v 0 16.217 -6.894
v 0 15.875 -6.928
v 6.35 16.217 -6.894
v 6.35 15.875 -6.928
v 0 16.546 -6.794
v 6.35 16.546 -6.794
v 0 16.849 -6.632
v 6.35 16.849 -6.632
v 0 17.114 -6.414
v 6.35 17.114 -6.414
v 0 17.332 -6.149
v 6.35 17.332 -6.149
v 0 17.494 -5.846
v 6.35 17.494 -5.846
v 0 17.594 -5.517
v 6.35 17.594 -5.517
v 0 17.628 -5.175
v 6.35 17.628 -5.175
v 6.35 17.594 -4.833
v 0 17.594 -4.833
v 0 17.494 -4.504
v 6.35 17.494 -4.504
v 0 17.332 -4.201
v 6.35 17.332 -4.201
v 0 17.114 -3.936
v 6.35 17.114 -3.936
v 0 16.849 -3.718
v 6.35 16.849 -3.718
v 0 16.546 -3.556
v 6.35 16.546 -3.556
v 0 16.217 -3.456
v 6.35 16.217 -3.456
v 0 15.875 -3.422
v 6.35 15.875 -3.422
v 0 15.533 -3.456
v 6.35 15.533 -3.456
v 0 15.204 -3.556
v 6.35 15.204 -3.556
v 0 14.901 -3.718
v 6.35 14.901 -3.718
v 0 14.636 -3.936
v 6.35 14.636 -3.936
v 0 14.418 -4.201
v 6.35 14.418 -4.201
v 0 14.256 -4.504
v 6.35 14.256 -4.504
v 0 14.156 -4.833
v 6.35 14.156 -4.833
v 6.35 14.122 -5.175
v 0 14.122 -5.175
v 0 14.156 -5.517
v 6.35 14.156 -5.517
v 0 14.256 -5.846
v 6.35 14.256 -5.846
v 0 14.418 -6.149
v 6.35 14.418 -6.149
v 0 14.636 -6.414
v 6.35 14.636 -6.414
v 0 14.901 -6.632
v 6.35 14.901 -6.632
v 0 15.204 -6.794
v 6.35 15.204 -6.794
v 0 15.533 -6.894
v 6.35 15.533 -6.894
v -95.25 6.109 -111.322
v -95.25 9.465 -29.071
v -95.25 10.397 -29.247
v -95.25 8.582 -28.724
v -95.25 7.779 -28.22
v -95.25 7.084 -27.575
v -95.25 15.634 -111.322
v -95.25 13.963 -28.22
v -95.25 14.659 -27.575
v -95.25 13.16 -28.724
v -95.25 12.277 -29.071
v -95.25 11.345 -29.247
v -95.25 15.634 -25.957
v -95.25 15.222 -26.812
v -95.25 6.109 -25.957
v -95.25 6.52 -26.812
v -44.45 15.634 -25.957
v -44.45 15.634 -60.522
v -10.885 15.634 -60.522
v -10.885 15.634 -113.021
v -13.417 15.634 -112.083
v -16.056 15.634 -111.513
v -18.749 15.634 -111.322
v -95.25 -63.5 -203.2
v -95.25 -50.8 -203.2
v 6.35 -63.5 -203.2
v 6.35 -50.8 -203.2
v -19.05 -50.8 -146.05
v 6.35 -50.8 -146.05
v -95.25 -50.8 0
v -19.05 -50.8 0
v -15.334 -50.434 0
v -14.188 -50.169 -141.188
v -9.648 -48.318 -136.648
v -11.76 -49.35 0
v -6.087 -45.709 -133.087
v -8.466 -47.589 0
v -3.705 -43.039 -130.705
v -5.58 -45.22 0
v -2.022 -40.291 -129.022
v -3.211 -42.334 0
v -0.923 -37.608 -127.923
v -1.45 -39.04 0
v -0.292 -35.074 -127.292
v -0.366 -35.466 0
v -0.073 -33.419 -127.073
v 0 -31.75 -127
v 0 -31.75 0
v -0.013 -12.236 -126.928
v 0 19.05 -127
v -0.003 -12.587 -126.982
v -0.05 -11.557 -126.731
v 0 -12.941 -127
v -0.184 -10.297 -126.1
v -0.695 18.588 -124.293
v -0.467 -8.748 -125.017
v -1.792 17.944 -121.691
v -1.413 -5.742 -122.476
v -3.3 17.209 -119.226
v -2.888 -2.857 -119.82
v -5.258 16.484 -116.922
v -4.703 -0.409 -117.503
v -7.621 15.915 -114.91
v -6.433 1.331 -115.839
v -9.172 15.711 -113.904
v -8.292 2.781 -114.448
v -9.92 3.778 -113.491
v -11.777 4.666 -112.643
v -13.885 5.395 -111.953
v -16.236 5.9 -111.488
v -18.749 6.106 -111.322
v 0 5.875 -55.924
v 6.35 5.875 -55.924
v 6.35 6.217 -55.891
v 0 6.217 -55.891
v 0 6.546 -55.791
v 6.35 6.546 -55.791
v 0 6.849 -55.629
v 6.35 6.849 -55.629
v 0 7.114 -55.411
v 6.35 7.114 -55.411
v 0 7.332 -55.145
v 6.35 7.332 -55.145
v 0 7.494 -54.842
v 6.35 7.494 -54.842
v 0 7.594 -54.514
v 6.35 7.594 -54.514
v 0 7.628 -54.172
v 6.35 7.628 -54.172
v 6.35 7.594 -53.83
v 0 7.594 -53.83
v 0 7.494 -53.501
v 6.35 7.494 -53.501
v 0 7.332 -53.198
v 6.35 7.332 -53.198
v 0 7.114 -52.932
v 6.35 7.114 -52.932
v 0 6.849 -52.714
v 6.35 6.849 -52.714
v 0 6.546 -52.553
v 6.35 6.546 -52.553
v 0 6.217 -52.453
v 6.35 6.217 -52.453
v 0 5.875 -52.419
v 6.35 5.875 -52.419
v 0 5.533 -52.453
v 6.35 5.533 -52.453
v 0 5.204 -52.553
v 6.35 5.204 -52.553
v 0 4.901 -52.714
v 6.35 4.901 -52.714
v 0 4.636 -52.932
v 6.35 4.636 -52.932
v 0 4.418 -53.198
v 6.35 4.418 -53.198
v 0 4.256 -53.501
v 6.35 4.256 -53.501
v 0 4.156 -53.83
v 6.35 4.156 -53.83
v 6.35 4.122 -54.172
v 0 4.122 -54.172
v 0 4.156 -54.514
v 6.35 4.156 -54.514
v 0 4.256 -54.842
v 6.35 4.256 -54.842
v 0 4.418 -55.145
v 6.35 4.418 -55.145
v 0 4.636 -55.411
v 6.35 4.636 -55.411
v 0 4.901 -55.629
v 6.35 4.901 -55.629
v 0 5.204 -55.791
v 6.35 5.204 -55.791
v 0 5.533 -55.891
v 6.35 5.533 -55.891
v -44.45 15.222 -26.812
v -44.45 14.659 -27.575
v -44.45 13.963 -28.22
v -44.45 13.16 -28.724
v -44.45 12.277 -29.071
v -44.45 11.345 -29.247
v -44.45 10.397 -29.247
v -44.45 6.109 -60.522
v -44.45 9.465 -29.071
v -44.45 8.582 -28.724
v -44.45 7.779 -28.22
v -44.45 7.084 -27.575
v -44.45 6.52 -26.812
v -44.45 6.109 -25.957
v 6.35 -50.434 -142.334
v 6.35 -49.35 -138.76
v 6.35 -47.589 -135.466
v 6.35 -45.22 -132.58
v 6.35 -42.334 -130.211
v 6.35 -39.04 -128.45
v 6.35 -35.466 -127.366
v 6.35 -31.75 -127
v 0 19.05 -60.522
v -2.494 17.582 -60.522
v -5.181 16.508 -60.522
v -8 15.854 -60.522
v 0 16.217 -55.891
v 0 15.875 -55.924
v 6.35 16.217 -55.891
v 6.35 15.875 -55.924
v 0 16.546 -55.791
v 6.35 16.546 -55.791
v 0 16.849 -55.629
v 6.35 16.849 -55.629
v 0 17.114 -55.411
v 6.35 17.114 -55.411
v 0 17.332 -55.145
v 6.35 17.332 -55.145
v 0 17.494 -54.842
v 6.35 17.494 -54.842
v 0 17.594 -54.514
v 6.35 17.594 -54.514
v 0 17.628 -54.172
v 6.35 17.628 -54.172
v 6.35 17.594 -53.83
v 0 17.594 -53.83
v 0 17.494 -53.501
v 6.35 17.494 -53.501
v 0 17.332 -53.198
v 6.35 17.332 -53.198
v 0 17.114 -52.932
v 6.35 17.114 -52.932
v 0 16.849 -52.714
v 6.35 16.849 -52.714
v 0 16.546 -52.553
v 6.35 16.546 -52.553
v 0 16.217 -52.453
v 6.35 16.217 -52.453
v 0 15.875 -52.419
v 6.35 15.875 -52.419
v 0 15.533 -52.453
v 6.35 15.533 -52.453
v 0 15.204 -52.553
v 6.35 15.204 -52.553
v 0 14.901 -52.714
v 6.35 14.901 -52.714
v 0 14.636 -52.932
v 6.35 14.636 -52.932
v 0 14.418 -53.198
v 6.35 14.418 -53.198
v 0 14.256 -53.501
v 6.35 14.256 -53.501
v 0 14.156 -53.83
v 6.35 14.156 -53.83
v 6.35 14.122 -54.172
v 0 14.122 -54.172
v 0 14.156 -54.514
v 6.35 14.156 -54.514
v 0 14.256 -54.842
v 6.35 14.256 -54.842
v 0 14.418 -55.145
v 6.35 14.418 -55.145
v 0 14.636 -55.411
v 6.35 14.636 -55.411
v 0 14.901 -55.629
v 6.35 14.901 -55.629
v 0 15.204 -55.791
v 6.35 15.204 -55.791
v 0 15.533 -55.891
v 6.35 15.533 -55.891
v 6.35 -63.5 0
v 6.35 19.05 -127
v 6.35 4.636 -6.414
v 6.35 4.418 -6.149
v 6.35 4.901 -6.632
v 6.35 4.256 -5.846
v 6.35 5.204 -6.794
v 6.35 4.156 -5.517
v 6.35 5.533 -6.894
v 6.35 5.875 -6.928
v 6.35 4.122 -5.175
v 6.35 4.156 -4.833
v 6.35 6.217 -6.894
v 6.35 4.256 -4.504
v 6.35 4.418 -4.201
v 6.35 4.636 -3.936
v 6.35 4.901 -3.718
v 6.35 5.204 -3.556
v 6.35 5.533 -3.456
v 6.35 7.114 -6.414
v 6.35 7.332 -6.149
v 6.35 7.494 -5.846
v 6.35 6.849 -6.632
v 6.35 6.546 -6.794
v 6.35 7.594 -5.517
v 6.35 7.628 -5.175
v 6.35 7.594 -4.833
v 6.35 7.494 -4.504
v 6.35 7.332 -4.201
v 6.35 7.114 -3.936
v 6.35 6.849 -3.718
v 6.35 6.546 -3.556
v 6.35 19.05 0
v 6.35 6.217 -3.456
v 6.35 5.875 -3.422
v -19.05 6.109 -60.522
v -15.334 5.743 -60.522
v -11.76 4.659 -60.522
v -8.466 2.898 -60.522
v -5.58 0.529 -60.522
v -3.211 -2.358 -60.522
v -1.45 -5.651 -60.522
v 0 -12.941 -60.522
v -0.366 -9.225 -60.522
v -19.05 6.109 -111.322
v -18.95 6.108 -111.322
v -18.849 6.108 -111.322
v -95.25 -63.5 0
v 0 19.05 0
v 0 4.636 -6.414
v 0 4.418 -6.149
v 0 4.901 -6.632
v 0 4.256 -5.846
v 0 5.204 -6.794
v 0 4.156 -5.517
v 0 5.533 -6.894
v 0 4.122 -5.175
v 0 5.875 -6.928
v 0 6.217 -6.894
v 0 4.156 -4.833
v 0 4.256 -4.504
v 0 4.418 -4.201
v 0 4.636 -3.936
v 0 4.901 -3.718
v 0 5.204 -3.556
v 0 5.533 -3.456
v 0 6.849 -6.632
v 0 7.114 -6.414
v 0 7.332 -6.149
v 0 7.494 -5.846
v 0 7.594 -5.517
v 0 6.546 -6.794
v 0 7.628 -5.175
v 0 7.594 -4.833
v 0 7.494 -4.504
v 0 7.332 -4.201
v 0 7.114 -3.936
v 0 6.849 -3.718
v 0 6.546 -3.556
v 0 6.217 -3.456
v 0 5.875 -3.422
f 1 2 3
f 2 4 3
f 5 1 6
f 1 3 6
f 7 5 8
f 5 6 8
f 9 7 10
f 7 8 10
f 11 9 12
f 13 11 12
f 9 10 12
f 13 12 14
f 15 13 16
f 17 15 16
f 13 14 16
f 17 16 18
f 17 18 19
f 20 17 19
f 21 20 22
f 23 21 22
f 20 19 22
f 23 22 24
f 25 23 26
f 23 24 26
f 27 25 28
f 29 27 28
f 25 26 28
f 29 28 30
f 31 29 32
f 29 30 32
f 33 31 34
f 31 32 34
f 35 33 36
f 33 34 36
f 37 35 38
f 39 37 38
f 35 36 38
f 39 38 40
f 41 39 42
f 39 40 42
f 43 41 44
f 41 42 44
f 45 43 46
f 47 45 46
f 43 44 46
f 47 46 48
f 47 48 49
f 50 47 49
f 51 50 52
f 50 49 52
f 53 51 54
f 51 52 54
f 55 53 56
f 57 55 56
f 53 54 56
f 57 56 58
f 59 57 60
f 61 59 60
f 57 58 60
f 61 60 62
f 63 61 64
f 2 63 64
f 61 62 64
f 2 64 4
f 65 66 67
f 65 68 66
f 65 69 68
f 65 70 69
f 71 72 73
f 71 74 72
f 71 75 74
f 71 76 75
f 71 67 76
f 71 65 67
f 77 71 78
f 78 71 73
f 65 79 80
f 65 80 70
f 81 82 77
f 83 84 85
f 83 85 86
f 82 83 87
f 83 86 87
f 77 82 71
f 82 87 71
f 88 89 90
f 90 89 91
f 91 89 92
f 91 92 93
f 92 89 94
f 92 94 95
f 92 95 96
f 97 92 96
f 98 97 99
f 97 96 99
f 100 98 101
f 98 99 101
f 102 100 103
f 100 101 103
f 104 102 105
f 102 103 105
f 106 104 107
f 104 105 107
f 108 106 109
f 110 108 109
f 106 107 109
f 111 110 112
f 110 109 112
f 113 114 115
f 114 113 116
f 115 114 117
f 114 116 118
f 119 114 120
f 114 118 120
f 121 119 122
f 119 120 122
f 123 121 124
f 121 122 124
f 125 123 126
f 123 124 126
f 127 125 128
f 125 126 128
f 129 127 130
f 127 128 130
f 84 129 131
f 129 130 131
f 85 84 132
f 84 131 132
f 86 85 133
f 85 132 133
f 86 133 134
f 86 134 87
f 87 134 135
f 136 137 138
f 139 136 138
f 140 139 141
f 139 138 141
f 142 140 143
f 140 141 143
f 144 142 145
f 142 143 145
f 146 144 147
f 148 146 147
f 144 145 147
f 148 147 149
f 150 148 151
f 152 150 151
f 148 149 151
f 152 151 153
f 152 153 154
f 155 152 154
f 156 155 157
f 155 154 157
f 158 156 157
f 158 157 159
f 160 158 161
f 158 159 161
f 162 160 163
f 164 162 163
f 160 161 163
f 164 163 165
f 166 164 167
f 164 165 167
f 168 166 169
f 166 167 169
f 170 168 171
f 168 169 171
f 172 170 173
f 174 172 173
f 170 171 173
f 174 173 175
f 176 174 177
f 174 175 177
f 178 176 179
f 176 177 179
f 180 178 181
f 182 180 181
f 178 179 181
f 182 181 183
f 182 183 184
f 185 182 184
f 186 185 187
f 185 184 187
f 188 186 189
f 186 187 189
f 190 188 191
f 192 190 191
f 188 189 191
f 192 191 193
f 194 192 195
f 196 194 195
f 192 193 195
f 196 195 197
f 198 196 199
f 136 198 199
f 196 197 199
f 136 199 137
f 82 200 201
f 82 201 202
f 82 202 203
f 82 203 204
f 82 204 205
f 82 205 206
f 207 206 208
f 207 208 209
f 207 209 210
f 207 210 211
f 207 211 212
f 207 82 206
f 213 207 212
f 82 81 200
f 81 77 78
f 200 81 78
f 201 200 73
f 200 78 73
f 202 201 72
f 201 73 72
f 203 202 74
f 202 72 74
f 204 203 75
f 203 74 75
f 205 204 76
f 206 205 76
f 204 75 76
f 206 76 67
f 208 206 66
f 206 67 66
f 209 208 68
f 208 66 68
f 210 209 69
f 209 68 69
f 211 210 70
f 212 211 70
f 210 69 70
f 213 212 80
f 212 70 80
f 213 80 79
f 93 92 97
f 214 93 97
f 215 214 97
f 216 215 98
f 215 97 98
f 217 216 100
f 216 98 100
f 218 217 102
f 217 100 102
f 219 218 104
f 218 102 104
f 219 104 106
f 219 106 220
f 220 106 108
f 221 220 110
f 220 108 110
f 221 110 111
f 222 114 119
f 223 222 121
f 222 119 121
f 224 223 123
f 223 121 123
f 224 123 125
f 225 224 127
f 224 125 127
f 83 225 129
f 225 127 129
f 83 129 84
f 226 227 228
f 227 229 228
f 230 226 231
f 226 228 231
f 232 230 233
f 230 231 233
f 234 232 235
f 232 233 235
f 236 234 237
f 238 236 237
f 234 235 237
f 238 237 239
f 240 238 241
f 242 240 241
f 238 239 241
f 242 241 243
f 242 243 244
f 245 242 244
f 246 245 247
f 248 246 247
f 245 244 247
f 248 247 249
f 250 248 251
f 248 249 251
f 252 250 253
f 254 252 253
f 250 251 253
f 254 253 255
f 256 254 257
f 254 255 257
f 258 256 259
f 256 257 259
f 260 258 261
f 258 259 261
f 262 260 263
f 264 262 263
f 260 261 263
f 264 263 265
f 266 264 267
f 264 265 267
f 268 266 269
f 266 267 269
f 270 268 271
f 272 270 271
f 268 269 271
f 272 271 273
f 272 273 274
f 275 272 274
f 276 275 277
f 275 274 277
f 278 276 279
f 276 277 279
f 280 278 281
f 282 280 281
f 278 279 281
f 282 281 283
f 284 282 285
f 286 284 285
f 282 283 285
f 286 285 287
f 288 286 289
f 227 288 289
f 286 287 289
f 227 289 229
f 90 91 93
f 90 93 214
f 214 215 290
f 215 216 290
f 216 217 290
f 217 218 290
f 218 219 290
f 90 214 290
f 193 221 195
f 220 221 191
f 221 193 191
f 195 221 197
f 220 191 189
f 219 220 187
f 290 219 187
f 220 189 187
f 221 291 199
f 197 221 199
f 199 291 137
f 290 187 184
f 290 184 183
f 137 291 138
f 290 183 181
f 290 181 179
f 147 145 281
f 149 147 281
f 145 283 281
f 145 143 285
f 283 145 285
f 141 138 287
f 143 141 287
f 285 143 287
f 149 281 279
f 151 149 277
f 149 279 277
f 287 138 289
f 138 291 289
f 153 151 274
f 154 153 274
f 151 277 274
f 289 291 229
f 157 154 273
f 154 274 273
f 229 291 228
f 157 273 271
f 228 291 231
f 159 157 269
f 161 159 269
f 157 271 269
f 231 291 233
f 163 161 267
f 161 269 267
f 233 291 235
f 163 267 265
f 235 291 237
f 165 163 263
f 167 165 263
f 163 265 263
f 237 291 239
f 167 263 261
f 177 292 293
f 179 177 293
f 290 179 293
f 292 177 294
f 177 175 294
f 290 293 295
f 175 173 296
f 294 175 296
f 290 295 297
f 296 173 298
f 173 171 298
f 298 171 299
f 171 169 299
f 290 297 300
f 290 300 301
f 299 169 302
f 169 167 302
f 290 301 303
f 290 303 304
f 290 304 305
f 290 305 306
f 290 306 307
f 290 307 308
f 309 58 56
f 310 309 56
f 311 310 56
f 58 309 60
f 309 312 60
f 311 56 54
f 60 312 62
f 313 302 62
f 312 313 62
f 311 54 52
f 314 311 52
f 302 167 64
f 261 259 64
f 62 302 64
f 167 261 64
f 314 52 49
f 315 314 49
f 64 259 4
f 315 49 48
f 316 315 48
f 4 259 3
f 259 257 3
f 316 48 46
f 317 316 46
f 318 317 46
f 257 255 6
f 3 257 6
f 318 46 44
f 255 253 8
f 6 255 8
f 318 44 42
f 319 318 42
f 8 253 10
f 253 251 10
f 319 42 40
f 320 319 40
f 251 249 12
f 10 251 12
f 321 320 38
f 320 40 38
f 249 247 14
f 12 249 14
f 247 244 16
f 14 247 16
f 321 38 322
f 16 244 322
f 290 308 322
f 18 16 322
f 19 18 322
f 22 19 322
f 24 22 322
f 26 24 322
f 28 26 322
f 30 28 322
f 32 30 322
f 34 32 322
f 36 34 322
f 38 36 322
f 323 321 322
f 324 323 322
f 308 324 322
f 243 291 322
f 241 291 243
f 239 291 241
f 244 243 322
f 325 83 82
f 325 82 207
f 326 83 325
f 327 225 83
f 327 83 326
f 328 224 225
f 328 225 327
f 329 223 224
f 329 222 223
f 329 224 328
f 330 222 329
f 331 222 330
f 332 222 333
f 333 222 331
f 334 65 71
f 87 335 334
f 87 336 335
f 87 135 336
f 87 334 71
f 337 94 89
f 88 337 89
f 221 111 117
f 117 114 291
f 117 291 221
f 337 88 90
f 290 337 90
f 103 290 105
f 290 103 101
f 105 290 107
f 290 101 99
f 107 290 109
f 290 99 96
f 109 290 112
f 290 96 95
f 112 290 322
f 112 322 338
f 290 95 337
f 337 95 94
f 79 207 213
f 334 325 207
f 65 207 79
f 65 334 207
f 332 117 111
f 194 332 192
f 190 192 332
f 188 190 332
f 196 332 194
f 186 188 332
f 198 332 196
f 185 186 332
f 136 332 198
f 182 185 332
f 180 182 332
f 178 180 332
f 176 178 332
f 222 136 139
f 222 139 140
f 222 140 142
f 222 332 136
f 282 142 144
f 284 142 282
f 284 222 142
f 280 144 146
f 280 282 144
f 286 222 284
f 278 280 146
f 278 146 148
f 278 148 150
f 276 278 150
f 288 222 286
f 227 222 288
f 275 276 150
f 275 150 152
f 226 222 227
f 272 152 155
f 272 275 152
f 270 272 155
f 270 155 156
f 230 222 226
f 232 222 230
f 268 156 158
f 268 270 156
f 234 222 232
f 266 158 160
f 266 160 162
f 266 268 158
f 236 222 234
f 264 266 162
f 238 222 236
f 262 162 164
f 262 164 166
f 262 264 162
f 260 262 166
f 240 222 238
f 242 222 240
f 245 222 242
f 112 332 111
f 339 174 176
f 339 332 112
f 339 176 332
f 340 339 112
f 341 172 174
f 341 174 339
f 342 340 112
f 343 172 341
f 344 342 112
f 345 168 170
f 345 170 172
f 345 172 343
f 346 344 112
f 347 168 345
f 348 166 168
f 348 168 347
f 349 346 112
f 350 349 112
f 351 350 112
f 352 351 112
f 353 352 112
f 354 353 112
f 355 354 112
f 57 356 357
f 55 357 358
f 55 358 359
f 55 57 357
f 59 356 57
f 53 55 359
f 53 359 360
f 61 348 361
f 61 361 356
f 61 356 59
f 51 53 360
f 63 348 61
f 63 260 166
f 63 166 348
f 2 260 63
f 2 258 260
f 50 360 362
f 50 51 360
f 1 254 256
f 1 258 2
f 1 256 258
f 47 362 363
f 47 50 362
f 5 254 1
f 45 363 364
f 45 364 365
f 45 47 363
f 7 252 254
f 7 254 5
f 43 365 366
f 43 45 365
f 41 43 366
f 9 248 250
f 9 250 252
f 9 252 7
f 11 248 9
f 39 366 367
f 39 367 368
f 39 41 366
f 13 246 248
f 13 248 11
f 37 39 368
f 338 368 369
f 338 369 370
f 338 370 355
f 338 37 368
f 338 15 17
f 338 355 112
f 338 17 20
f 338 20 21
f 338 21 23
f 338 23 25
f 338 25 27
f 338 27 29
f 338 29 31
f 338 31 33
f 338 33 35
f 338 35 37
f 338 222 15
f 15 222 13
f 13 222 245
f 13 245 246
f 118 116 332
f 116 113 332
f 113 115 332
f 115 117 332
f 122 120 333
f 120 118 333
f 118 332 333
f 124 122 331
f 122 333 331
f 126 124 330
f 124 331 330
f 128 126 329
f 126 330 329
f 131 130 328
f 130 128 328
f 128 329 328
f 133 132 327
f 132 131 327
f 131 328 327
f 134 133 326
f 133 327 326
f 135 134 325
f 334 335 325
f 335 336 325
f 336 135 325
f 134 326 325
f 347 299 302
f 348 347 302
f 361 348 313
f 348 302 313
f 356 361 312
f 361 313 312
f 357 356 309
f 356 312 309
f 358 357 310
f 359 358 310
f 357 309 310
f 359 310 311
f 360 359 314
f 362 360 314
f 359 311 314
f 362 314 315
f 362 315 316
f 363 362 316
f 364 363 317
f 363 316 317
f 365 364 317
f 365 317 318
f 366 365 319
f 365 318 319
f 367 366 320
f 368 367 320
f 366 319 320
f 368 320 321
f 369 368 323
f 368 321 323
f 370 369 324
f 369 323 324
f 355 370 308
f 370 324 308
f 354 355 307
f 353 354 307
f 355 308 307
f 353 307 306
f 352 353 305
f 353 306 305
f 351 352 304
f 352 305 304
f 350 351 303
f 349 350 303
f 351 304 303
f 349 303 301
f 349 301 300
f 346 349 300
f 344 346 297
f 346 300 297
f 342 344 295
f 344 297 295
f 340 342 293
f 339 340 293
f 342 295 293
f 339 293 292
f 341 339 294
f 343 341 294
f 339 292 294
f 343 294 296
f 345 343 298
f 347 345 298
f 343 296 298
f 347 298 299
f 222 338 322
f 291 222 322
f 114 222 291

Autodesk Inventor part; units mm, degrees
ref_plane "YZ Plane" through (0, 0, 0) normal (1, 0, 0) x (0, 1, 0)
ref_plane "XZ Plane" through (0, 0, 0) normal (0, 1, 0) x (-1, 0, 0)
ref_plane "XY Plane" through (0, 0, 0) normal (0, 0, 1) x (1, 0, 0)
sketch "Sketch1" plane through (0, 0, 0) normal (1, 0, 0) x (0, 1, 0)
  line L0 (0, 0) -> (19.05, 0)
  line L1 (19.05, 0) -> (19.05, -127)
  line L2 (19.05, -127) -> (0, -127)
  line L3 (0, -127) -> (0, 0)
  dimension "d0" = 19.05
  dimension "d1" = 127
extrude "Extrusion1" add sketch "Sketch1" along normal blind 6.35
sketch "Sketch2" plane through (6.35, 0, 0) normal (1, 0, 0) x (0, 0, -1)
  circle A0 centre (5.1751, 15.875) radius 1.7526
  circle A1 centre (5.1751, 5.875) radius 1.7526
  line L0 (127, 19.05) -> (0, 19.05) projected
  circle A2 centre (54.1717, 15.875) radius 1.7526
  circle A3 centre (54.1717, 5.875) radius 1.7526
  point P0 (0, 0)
  dimension "d4" = 3.5052
  dimension "d5" = 3.5052
  dimension "d6" = 10
  dimension "d7" = 3.175
  dimension "d11" = 3.5052
  dimension "d12" = 48.9966
  dimension "d13" = 3.5052
extrude "Extrusion2" cut sketch "Sketch2" against normal through all
sketch "Sketch3" plane through (0, 0, -127) normal (0, -1, 0) x (1, 0, 0)
  line L0 (6.35, 0) -> (6.35, 127) projected
  line L1 (0, 0) -> (0, 127) projected
  line L2 (6.35, 127) -> (0, 127)
  line L3 (0, 127) -> (0, 0)
  line L4 (0, 0) -> (6.35, 0)
  line L5 (6.35, 0) -> (6.35, 127)
  point P0 (0, 127)
extrude "Extrusion3" add sketch "Sketch3" along normal blind 50.8
sketch "Sketch4" plane through (0, -50.8, -127) normal (0, -1, 0) x (1, 0, 0)
  line L0 (6.35, 0) -> (6.35, 127) projected
  line L1 (6.35, 127) -> (-95.25, 127)
  line L2 (-95.25, 127) -> (-95.25, -76.2)
  line L3 (-95.25, -76.2) -> (6.35, -76.2)
  line L4 (6.35, -76.2) -> (6.35, 127)
  point P0 (0, 127)
  point P1 (6.35, 0)
  dimension "d16" = 203.2
  dimension "d17" = 101.6
extrude "Extrusion4" add sketch "Sketch4" along normal blind 12.7
fillet "Fillet1" radius 19.05 1 edges at (0, -50.8, -63.5)
fillet "Fillet2" radius 19.05 2 edges at (-9.525, -50.8, -127) (3.175, -50.8, -127)
sketch "Sketch5" plane through (0, 0, 0) normal (-1, 0, 0) x (0, 0, 1)
  line L0 (-111.3217, 15.6337) -> (-60.5217, 15.6337)
  line L1 (-60.5217, 15.6337) -> (-60.5217, 6.1087)
  line L2 (-60.5217, 6.1087) -> (-111.3217, 6.1087)
  line L3 (-111.3217, 6.1087) -> (-111.3217, 15.6337)
  circle A0 centre (-54.1717, 5.875) radius 1.7526 projected
  circle A1 centre (-54.1717, 15.875) radius 1.7526 projected
  point P0 (0, 0)
  point P1 (-60.5217, 10.8712)
  dimension "d22" = 9.525
  dimension "d23" = 50.8
  dimension "d26" = 5.0038
  dimension "d27" = 6.35
extrude "Extrusion5" add sketch "Sketch5" along normal blind 95.25 contours L0 L1 L2 L3
sketch "Sketch6" plane through (0, 6.1087, -60.5217) normal (0, 0, 1) x (1, 0, 0)
  line L0 (0, 9.525) -> (-95.25, 9.525) projected
  line L1 (0, 0) -> (-95.25, 0) projected
  line L2 (-95.25, 9.525) -> (-44.45, 9.525)
  line L3 (-44.45, 9.525) -> (-44.45, 0)
  line L4 (-44.45, 0) -> (-95.25, 0)
  line L5 (-95.25, 0) -> (-95.25, 9.525)
  point P0 (0, -6.1087)
  dimension "d30" = 50.8
extrude "Extrusion6" add sketch "Sketch6" along normal blind 38.1
sketch "Sketch7" plane through (-95.25, 0, 0) normal (-1, 0, 0) x (0, 0, 1)
  line L0 (-22.4217, 15.6337) -> (-22.4217, 6.1087) projected
  arc A0 (-22.4217, 15.6337) -> (-22.4217, 6.1087) centre (-24.1894, 10.8712) ccw
  line L1 (-22.4217, 15.6337) -> (-22.4217, 6.1087)
  point P0 (0, 0)
  dimension "d33" = 5.08
extrude "Extrusion7" cut sketch "Sketch7" against normal up to surface (50.8 mm away)
fillet "Fillet3" radius 19.05 3 edges at (0, 6.1087, -85.9217) (0, 10.8712, -111.3217) (0, 15.6337, -85.9217)
properties part number "motor plate"
